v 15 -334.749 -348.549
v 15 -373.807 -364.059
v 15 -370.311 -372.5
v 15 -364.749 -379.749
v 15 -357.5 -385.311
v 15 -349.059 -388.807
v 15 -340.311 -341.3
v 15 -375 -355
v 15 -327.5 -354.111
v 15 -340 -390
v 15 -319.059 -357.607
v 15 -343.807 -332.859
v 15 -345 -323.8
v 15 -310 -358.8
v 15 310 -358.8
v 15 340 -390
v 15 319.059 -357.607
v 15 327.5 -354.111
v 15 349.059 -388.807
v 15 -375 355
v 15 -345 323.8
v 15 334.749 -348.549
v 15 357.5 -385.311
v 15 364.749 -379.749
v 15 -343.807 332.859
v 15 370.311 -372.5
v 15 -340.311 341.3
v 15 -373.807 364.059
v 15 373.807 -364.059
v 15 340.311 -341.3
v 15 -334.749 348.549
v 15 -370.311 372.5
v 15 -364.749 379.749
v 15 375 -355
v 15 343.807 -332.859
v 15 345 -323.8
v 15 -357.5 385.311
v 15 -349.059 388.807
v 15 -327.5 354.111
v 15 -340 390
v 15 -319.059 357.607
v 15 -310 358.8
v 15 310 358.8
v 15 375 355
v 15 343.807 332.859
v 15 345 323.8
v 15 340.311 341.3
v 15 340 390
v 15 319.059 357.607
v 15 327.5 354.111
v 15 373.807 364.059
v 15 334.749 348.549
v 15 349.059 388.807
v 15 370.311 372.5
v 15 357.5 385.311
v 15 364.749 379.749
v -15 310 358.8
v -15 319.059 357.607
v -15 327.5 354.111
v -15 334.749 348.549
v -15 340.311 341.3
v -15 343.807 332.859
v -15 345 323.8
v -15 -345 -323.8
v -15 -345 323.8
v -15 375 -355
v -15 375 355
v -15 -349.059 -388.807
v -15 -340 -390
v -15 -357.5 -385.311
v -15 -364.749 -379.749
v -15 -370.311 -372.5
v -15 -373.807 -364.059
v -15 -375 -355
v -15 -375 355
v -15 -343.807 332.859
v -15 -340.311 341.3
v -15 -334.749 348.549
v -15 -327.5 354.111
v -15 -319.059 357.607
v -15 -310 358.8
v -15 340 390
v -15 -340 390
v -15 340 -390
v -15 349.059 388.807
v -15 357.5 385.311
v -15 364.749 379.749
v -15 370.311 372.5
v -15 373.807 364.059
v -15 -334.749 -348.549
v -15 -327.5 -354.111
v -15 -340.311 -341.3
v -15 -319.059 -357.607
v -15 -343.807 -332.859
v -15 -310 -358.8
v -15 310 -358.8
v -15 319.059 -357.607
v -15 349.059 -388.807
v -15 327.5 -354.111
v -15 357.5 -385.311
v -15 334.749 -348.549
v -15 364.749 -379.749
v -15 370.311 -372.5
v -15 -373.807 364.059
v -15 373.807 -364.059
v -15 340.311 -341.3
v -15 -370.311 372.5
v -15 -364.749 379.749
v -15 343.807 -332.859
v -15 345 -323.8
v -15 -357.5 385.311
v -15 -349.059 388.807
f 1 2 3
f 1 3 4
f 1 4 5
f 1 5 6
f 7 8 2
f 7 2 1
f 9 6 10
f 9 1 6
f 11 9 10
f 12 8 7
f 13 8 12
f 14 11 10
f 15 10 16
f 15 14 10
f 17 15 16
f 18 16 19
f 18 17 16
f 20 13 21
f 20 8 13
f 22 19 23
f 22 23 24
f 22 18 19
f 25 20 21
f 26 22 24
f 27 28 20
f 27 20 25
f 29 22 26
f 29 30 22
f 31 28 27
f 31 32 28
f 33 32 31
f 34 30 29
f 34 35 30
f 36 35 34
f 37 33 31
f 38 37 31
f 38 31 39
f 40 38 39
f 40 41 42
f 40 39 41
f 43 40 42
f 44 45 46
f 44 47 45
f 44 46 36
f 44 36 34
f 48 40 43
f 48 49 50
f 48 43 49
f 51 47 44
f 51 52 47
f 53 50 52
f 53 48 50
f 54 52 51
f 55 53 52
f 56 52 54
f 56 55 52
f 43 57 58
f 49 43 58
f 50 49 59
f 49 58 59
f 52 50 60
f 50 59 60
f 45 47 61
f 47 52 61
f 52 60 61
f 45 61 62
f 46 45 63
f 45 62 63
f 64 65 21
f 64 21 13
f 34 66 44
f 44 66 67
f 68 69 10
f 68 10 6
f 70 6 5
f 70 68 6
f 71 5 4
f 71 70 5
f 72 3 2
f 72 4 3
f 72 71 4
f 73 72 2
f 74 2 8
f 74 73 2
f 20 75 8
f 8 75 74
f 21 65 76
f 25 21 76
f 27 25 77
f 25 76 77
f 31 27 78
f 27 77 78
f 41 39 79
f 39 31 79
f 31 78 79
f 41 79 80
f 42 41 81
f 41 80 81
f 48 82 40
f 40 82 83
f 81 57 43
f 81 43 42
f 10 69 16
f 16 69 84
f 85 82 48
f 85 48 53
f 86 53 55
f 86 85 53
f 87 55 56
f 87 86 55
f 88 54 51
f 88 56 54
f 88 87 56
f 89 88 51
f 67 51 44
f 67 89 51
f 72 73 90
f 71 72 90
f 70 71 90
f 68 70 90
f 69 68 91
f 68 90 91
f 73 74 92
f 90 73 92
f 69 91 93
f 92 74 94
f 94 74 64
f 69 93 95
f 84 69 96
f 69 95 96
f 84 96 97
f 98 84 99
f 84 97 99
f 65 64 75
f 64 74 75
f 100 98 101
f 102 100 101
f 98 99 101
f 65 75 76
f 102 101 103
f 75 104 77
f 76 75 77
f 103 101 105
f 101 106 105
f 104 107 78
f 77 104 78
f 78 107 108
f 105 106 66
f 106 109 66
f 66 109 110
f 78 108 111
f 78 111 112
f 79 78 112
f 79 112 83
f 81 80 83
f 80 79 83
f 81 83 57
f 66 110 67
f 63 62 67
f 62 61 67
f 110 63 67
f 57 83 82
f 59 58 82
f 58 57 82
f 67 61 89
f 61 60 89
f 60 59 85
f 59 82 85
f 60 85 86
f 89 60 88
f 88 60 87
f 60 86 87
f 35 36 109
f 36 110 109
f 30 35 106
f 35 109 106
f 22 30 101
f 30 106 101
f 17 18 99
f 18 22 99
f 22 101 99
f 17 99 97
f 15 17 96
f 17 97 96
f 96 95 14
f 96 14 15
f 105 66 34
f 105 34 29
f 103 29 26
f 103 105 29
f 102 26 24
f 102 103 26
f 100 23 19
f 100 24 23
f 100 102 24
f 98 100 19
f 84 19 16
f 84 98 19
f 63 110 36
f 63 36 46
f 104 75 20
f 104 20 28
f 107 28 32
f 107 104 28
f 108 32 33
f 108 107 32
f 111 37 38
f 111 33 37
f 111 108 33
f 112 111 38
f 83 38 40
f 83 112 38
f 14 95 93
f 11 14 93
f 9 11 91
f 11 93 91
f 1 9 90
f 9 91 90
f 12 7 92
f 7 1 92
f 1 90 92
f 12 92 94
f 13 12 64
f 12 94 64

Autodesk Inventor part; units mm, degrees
sketch "Esboço1" plane through (0, 0, 0) normal (1, 0, 0) x (0, 1, 0)
  line L0 (-340, -390) -> (340, -390)
  line L1 (375, -355) -> (375, 355)
  line L2 (340, 390) -> (-340, 390)
  line L3 (-375, 355) -> (-375, -355)
  line L4 (-375, -390) -> (375, 390) construction
  line L5 (375, -390) -> (-375, 390) construction
  line L6 (-310, -358.8) -> (310, -358.8)
  line L7 (345, -323.8) -> (345, 323.8)
  line L8 (310, 358.8) -> (-310, 358.8)
  line L9 (-345, 323.8) -> (-345, -323.8)
  line L10 (-345, -358.8) -> (345, 358.8) construction
  line L11 (345, -358.8) -> (-345, 358.8) construction
  arc A0 (345, 323.8) -> (310, 358.8) centre (310, 323.8) ccw
  arc A1 (375, 355) -> (340, 390) centre (340, 355) ccw
  arc A2 (340, -390) -> (375, -355) centre (340, -355) ccw
  arc A3 (310, -358.8) -> (345, -323.8) centre (310, -323.8) ccw
  arc A4 (-310, 358.8) -> (-345, 323.8) centre (-310, 323.8) ccw
  arc A5 (-345, -323.8) -> (-310, -358.8) centre (-310, -323.8) ccw
  arc A6 (-375, -355) -> (-340, -390) centre (-340, -355) ccw
  arc A7 (-340, 390) -> (-375, 355) centre (-340, 355) ccw
  point P0 (0, 0)
  dimension "d0" = 780
  dimension "d1" = 750
  dimension "d2" = 30
  dimension "d3" = 35
  dimension "d4" = 35
  dimension "d5" = 35
extrude "Extrusão1" add sketch "Esboço1" along normal mid plane 30
equation "\"Raio_vergadura\" = Espessura"
equation "\"Largura_alívio_de_vergadura\" = Espessura"
equation "\"Profundidade_alívio_de_vergadura\" = 0.5 * Espessura"
equation "\"Tamanho_alívio_de_dobra\" = 4 * Espessura"
equation "\"Remanescente_mínimo\" = 2 * Espessura"
equation "\"Raiodetransição\" = Raio_vergadura"
equation "\"Tamanho_de_raio_de_Jacobi\" = Raio_vergadura"
equation "\"TamanhoFolga\" = Espessura"
equation "\"Espessura\" = 0.5"
properties part number "Pés"
